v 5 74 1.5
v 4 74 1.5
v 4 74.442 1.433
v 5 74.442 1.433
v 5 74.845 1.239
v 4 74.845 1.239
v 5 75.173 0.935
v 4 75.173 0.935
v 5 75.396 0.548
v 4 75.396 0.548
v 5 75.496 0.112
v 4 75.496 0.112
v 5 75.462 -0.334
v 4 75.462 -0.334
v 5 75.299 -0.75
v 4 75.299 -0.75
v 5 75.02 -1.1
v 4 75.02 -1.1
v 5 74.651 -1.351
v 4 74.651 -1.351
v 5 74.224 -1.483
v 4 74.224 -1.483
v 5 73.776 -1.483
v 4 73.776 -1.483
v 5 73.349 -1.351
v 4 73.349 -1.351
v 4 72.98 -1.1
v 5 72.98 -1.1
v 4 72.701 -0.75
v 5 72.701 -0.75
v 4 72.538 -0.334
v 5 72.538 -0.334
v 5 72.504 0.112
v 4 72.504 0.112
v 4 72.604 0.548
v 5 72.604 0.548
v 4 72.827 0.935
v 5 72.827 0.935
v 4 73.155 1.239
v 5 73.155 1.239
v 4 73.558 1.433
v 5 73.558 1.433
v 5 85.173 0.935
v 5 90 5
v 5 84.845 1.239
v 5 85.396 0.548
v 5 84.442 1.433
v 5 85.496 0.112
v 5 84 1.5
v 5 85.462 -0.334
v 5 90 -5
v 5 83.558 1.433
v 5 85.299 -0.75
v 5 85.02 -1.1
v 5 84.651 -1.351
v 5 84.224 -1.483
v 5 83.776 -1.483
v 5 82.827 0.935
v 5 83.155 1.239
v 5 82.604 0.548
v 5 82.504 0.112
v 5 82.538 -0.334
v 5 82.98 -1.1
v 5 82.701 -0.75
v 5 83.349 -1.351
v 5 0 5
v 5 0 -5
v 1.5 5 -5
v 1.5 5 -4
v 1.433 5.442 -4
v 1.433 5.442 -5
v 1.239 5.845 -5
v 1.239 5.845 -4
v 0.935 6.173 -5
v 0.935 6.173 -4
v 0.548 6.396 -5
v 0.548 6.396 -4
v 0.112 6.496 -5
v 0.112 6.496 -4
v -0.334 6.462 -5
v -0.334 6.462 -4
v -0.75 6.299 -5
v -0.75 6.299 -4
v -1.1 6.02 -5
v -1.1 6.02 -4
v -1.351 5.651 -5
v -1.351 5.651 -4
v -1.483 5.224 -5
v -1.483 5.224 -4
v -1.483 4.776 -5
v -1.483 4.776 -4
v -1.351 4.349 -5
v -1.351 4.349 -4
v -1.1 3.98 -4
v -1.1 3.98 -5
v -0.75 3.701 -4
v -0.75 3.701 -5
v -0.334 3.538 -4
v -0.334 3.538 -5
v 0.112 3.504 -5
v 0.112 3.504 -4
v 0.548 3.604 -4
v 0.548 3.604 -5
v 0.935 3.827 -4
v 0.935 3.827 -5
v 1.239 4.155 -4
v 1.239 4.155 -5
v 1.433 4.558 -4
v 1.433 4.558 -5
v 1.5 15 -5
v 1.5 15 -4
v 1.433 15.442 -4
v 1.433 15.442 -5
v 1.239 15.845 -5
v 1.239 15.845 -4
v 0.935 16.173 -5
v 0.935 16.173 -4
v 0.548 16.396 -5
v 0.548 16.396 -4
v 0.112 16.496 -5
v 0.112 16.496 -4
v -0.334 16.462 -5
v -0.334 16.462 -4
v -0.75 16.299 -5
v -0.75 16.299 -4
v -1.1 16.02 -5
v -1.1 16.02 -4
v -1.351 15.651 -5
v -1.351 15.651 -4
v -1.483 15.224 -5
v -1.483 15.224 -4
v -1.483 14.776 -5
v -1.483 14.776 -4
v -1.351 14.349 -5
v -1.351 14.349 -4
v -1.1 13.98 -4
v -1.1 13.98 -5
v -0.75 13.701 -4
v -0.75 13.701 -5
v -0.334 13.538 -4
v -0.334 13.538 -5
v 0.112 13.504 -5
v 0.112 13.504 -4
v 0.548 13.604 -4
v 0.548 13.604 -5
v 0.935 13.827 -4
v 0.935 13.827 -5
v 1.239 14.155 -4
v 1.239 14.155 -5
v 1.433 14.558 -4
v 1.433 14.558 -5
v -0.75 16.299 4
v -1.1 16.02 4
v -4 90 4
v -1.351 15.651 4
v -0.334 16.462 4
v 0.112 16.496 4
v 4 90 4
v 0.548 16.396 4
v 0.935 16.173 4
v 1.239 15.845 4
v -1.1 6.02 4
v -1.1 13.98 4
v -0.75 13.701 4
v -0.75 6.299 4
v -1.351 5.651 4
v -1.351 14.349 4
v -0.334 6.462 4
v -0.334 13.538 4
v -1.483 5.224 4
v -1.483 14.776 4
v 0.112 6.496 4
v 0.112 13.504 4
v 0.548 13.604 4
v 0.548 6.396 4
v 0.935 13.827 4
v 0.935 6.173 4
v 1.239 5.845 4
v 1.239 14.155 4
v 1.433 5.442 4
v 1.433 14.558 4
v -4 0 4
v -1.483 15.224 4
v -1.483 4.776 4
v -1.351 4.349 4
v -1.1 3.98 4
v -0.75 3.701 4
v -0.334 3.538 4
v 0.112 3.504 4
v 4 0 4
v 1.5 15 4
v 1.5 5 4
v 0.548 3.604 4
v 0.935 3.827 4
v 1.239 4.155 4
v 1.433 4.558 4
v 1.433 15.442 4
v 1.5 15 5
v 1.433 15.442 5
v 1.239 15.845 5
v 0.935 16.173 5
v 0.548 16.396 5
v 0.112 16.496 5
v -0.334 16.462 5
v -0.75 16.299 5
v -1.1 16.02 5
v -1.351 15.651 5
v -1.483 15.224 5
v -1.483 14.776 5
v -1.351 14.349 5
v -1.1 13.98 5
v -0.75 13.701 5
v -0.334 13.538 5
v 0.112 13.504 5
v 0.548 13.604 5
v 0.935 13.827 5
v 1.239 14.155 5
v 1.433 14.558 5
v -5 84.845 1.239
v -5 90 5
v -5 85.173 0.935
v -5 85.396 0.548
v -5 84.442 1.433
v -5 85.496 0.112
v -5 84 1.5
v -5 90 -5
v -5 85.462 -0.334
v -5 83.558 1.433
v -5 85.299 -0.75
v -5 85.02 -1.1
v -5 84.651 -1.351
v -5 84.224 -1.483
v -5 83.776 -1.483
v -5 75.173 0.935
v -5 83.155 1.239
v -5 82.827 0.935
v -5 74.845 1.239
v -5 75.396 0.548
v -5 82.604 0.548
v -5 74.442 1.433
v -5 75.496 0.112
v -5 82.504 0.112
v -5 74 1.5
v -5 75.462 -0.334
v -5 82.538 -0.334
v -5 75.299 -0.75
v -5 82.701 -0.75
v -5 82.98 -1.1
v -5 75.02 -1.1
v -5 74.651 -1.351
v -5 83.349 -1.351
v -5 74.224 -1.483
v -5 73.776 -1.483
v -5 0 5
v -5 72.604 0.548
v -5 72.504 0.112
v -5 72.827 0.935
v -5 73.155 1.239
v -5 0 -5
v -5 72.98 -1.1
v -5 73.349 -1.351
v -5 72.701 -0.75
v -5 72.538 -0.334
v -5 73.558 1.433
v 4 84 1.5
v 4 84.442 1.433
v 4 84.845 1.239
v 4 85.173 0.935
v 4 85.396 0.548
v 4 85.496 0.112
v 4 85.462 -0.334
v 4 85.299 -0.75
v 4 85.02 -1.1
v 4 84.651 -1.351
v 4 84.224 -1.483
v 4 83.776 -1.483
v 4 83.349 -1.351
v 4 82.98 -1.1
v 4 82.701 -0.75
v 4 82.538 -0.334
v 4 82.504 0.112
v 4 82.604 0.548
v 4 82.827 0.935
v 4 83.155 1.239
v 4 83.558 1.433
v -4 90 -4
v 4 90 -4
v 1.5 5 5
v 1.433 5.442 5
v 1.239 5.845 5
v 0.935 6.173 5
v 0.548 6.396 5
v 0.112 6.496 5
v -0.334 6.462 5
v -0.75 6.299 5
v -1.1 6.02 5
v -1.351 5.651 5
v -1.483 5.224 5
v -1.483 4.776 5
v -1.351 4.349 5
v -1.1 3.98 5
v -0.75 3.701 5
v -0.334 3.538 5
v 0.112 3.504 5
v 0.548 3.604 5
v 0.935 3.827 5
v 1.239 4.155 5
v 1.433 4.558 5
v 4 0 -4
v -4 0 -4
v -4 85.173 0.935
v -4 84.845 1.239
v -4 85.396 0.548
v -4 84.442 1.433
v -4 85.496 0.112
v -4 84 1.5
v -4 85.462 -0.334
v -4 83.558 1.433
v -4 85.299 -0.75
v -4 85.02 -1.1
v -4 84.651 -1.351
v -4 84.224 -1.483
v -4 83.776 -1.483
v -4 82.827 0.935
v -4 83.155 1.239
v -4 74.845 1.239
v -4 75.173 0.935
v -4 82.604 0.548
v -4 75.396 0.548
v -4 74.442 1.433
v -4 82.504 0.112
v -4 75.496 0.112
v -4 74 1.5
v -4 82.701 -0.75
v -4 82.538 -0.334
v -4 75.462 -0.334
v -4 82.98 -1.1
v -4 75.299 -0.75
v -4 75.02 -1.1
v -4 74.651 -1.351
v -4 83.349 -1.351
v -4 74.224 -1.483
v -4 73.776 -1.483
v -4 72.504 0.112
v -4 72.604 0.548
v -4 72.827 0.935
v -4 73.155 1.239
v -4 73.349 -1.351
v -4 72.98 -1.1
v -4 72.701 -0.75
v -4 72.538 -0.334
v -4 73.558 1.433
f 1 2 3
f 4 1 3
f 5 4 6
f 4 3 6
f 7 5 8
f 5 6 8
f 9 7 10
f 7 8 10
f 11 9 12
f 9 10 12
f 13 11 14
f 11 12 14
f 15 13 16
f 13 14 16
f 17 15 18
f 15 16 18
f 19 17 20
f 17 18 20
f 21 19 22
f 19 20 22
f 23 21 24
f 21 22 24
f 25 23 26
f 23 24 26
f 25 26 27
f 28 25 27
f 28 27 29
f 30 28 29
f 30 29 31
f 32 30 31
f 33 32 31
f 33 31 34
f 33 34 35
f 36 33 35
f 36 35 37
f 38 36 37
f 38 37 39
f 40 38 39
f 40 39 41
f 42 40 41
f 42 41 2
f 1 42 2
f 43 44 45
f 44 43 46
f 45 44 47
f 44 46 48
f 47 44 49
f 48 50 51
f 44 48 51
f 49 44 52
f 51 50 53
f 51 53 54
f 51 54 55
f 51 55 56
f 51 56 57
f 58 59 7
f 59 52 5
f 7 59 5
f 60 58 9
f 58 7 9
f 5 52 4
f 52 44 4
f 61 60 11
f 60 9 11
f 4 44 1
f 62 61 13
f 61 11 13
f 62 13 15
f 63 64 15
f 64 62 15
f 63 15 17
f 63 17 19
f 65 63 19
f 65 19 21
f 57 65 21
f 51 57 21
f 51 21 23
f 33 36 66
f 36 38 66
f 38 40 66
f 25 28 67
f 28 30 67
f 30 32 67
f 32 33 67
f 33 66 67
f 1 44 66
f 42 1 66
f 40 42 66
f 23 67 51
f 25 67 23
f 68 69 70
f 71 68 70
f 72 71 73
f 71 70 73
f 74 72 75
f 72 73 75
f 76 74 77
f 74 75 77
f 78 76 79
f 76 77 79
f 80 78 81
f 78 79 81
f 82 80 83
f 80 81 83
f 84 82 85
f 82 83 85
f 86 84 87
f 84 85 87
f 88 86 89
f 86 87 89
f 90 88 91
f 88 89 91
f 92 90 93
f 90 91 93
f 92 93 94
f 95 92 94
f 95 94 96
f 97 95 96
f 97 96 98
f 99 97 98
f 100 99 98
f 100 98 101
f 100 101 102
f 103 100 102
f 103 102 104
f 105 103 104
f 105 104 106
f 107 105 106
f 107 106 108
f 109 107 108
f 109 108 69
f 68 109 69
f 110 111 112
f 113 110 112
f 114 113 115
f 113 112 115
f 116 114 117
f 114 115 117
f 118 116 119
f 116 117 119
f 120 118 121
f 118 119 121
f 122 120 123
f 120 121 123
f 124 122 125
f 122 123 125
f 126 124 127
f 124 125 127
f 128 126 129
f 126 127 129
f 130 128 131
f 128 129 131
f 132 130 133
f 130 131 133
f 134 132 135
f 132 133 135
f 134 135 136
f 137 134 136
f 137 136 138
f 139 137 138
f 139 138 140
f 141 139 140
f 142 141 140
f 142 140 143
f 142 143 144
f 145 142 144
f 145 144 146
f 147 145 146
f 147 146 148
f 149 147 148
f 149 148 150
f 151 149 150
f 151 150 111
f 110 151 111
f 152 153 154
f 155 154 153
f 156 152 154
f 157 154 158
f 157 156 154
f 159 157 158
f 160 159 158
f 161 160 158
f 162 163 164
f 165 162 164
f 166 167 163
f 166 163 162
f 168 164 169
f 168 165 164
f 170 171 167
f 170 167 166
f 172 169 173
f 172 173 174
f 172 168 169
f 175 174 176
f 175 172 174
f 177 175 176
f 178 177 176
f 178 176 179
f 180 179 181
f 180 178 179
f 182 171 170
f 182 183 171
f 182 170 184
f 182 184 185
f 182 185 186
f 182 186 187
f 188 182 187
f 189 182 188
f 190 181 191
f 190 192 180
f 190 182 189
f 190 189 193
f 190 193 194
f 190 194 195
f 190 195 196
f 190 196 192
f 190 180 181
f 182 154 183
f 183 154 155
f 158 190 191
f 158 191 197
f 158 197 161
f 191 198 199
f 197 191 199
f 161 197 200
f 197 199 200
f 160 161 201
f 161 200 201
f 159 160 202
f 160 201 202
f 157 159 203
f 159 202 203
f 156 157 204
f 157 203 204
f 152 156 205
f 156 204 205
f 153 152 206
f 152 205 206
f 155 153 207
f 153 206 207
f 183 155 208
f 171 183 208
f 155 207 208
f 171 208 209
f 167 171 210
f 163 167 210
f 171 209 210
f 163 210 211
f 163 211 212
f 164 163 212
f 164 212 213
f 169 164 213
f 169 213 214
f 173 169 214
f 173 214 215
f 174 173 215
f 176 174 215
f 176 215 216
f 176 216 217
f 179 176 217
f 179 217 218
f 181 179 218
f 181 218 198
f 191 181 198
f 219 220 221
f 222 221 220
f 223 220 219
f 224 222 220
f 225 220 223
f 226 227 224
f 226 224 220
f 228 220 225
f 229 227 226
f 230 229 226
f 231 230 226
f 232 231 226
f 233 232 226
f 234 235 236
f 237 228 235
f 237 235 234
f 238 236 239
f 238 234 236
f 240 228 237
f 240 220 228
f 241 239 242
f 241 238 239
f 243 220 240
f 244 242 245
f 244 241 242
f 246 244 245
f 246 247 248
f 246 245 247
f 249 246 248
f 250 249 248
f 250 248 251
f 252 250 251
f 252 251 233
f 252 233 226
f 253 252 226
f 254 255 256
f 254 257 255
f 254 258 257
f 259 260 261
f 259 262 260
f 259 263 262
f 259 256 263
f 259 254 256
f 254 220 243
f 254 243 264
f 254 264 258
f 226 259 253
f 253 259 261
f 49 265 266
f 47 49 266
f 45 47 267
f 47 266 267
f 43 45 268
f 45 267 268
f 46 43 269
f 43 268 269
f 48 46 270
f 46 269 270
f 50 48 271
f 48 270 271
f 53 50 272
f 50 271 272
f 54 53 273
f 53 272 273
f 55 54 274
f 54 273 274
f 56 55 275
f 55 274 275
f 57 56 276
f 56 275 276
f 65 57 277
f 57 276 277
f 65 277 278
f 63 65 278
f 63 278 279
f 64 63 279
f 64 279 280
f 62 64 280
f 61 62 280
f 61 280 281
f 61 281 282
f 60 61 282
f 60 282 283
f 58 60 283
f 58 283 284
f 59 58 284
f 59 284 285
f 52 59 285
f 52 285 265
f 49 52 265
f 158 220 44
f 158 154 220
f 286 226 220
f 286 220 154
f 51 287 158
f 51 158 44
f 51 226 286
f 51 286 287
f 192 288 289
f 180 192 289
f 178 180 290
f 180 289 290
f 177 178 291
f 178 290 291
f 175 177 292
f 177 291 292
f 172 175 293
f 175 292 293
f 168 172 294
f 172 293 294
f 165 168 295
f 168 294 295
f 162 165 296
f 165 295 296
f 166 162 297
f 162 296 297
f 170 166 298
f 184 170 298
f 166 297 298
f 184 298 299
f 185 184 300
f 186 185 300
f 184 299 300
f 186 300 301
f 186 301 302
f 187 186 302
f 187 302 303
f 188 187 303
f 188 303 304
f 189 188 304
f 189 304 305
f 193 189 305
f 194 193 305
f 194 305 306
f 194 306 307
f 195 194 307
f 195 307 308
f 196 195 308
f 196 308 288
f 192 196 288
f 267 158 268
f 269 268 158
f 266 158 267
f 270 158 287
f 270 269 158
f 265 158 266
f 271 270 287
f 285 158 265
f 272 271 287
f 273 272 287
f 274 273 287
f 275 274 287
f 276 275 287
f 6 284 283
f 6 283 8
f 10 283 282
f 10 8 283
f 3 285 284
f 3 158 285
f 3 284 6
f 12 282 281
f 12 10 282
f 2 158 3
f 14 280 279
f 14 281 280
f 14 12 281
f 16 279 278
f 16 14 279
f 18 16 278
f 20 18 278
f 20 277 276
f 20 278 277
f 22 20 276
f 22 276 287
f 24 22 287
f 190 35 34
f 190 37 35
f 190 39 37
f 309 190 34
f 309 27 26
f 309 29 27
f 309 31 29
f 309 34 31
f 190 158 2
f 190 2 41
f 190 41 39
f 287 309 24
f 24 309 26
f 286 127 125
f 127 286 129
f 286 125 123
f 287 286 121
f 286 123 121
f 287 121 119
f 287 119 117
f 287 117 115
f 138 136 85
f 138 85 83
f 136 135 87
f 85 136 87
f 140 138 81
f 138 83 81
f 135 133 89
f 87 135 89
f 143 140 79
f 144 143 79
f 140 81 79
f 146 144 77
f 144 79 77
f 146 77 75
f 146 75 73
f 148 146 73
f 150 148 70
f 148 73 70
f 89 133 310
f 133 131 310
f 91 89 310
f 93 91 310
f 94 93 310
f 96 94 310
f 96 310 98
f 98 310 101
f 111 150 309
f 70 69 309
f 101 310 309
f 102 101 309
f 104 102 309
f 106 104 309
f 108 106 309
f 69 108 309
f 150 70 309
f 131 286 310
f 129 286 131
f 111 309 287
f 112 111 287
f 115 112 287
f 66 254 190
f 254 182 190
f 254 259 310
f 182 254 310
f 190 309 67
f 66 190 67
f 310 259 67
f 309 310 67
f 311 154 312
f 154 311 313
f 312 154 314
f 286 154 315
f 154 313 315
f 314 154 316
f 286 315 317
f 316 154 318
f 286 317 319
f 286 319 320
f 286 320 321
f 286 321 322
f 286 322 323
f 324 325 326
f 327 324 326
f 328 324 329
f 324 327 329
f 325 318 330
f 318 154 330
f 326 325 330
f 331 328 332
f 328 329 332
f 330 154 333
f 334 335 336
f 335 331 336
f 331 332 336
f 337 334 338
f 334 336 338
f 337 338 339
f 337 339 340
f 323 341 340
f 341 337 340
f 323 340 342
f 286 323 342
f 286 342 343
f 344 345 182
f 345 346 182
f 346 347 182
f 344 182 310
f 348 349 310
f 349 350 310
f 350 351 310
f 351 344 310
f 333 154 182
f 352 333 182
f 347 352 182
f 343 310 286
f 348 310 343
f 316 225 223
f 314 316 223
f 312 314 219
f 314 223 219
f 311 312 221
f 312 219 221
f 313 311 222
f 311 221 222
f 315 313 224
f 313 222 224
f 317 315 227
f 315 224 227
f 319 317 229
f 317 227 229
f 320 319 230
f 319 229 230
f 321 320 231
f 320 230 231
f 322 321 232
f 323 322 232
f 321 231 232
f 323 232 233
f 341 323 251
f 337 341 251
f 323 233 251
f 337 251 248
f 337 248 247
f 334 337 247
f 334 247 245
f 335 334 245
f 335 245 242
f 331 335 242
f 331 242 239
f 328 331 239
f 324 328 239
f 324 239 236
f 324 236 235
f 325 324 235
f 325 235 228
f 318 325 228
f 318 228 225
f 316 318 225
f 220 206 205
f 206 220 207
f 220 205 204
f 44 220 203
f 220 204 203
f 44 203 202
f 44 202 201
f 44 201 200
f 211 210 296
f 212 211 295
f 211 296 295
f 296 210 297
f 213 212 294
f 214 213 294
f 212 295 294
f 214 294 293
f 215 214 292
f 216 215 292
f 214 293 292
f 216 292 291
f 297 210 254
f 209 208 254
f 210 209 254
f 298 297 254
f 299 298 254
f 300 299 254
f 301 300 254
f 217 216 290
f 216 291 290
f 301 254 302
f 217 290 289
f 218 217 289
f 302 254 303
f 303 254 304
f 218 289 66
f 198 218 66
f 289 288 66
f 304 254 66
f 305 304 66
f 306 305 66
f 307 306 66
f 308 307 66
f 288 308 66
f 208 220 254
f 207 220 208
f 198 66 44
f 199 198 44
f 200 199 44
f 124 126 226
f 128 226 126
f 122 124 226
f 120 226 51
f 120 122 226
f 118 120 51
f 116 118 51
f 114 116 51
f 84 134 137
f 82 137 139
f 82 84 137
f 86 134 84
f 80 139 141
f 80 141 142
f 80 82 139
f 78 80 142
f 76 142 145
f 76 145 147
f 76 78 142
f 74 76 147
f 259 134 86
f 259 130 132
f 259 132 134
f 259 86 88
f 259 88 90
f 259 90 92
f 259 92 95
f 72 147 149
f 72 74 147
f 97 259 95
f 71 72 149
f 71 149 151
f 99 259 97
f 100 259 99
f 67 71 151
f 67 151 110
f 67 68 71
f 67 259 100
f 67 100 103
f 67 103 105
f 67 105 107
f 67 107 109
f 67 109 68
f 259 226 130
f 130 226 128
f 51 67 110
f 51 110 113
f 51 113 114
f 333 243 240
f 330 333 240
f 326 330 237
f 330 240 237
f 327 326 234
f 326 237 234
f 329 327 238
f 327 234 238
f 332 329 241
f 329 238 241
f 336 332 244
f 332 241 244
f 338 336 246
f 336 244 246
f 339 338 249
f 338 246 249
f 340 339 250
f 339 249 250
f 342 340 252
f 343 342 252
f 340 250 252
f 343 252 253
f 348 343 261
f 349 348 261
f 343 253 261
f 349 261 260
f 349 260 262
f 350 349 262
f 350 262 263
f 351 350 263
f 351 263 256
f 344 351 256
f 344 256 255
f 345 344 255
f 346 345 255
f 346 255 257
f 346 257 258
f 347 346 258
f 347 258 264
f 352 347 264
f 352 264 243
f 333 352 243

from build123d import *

# Parameters (mm, degrees)
SKETCH_1_W          = 10
SKETCH_1_H          = 10
SKETCH_1_W_2        = 8
SKETCH_1_H_2        = 8
EXTRUDE_1_DEPTH     = 90
SKETCH_2_R          = 1.5
CUT_EXTRUDE_1_DEPTH = 30
SKETCH_3_R          = 1.5
CUT_EXTRUDE_2_DEPTH = 30


with BuildPart() as part:
    # 草图1 → 凸台-拉伸1 (new body)
    with BuildSketch(Plane(origin=(0, 0, 0), x_dir=(1, 0, 0), z_dir=(0, 1, 0))):
        Rectangle(SKETCH_1_W, SKETCH_1_H)
        Rectangle(SKETCH_1_W_2, SKETCH_1_H_2, mode=Mode.SUBTRACT)
    extrude(amount=EXTRUDE_1_DEPTH)

    # 草图2 → 切除-拉伸1 (cut)
    with BuildSketch(Plane.ZY.offset(5)):
        with Locations((0, 84)):
            Circle(SKETCH_2_R)
        with Locations((0, 74)):
            Circle(SKETCH_2_R)
    extrude(amount=-CUT_EXTRUDE_1_DEPTH, mode=Mode.SUBTRACT)

    # 草图3 → 切除-拉伸2 (cut)
    with BuildSketch(Plane.XY.offset(5)):
        with Locations((0, 5)):
            Circle(SKETCH_3_R)
        with Locations((0, 15)):
            Circle(SKETCH_3_R)
    extrude(amount=-CUT_EXTRUDE_2_DEPTH, mode=Mode.SUBTRACT)


solid = part.part
